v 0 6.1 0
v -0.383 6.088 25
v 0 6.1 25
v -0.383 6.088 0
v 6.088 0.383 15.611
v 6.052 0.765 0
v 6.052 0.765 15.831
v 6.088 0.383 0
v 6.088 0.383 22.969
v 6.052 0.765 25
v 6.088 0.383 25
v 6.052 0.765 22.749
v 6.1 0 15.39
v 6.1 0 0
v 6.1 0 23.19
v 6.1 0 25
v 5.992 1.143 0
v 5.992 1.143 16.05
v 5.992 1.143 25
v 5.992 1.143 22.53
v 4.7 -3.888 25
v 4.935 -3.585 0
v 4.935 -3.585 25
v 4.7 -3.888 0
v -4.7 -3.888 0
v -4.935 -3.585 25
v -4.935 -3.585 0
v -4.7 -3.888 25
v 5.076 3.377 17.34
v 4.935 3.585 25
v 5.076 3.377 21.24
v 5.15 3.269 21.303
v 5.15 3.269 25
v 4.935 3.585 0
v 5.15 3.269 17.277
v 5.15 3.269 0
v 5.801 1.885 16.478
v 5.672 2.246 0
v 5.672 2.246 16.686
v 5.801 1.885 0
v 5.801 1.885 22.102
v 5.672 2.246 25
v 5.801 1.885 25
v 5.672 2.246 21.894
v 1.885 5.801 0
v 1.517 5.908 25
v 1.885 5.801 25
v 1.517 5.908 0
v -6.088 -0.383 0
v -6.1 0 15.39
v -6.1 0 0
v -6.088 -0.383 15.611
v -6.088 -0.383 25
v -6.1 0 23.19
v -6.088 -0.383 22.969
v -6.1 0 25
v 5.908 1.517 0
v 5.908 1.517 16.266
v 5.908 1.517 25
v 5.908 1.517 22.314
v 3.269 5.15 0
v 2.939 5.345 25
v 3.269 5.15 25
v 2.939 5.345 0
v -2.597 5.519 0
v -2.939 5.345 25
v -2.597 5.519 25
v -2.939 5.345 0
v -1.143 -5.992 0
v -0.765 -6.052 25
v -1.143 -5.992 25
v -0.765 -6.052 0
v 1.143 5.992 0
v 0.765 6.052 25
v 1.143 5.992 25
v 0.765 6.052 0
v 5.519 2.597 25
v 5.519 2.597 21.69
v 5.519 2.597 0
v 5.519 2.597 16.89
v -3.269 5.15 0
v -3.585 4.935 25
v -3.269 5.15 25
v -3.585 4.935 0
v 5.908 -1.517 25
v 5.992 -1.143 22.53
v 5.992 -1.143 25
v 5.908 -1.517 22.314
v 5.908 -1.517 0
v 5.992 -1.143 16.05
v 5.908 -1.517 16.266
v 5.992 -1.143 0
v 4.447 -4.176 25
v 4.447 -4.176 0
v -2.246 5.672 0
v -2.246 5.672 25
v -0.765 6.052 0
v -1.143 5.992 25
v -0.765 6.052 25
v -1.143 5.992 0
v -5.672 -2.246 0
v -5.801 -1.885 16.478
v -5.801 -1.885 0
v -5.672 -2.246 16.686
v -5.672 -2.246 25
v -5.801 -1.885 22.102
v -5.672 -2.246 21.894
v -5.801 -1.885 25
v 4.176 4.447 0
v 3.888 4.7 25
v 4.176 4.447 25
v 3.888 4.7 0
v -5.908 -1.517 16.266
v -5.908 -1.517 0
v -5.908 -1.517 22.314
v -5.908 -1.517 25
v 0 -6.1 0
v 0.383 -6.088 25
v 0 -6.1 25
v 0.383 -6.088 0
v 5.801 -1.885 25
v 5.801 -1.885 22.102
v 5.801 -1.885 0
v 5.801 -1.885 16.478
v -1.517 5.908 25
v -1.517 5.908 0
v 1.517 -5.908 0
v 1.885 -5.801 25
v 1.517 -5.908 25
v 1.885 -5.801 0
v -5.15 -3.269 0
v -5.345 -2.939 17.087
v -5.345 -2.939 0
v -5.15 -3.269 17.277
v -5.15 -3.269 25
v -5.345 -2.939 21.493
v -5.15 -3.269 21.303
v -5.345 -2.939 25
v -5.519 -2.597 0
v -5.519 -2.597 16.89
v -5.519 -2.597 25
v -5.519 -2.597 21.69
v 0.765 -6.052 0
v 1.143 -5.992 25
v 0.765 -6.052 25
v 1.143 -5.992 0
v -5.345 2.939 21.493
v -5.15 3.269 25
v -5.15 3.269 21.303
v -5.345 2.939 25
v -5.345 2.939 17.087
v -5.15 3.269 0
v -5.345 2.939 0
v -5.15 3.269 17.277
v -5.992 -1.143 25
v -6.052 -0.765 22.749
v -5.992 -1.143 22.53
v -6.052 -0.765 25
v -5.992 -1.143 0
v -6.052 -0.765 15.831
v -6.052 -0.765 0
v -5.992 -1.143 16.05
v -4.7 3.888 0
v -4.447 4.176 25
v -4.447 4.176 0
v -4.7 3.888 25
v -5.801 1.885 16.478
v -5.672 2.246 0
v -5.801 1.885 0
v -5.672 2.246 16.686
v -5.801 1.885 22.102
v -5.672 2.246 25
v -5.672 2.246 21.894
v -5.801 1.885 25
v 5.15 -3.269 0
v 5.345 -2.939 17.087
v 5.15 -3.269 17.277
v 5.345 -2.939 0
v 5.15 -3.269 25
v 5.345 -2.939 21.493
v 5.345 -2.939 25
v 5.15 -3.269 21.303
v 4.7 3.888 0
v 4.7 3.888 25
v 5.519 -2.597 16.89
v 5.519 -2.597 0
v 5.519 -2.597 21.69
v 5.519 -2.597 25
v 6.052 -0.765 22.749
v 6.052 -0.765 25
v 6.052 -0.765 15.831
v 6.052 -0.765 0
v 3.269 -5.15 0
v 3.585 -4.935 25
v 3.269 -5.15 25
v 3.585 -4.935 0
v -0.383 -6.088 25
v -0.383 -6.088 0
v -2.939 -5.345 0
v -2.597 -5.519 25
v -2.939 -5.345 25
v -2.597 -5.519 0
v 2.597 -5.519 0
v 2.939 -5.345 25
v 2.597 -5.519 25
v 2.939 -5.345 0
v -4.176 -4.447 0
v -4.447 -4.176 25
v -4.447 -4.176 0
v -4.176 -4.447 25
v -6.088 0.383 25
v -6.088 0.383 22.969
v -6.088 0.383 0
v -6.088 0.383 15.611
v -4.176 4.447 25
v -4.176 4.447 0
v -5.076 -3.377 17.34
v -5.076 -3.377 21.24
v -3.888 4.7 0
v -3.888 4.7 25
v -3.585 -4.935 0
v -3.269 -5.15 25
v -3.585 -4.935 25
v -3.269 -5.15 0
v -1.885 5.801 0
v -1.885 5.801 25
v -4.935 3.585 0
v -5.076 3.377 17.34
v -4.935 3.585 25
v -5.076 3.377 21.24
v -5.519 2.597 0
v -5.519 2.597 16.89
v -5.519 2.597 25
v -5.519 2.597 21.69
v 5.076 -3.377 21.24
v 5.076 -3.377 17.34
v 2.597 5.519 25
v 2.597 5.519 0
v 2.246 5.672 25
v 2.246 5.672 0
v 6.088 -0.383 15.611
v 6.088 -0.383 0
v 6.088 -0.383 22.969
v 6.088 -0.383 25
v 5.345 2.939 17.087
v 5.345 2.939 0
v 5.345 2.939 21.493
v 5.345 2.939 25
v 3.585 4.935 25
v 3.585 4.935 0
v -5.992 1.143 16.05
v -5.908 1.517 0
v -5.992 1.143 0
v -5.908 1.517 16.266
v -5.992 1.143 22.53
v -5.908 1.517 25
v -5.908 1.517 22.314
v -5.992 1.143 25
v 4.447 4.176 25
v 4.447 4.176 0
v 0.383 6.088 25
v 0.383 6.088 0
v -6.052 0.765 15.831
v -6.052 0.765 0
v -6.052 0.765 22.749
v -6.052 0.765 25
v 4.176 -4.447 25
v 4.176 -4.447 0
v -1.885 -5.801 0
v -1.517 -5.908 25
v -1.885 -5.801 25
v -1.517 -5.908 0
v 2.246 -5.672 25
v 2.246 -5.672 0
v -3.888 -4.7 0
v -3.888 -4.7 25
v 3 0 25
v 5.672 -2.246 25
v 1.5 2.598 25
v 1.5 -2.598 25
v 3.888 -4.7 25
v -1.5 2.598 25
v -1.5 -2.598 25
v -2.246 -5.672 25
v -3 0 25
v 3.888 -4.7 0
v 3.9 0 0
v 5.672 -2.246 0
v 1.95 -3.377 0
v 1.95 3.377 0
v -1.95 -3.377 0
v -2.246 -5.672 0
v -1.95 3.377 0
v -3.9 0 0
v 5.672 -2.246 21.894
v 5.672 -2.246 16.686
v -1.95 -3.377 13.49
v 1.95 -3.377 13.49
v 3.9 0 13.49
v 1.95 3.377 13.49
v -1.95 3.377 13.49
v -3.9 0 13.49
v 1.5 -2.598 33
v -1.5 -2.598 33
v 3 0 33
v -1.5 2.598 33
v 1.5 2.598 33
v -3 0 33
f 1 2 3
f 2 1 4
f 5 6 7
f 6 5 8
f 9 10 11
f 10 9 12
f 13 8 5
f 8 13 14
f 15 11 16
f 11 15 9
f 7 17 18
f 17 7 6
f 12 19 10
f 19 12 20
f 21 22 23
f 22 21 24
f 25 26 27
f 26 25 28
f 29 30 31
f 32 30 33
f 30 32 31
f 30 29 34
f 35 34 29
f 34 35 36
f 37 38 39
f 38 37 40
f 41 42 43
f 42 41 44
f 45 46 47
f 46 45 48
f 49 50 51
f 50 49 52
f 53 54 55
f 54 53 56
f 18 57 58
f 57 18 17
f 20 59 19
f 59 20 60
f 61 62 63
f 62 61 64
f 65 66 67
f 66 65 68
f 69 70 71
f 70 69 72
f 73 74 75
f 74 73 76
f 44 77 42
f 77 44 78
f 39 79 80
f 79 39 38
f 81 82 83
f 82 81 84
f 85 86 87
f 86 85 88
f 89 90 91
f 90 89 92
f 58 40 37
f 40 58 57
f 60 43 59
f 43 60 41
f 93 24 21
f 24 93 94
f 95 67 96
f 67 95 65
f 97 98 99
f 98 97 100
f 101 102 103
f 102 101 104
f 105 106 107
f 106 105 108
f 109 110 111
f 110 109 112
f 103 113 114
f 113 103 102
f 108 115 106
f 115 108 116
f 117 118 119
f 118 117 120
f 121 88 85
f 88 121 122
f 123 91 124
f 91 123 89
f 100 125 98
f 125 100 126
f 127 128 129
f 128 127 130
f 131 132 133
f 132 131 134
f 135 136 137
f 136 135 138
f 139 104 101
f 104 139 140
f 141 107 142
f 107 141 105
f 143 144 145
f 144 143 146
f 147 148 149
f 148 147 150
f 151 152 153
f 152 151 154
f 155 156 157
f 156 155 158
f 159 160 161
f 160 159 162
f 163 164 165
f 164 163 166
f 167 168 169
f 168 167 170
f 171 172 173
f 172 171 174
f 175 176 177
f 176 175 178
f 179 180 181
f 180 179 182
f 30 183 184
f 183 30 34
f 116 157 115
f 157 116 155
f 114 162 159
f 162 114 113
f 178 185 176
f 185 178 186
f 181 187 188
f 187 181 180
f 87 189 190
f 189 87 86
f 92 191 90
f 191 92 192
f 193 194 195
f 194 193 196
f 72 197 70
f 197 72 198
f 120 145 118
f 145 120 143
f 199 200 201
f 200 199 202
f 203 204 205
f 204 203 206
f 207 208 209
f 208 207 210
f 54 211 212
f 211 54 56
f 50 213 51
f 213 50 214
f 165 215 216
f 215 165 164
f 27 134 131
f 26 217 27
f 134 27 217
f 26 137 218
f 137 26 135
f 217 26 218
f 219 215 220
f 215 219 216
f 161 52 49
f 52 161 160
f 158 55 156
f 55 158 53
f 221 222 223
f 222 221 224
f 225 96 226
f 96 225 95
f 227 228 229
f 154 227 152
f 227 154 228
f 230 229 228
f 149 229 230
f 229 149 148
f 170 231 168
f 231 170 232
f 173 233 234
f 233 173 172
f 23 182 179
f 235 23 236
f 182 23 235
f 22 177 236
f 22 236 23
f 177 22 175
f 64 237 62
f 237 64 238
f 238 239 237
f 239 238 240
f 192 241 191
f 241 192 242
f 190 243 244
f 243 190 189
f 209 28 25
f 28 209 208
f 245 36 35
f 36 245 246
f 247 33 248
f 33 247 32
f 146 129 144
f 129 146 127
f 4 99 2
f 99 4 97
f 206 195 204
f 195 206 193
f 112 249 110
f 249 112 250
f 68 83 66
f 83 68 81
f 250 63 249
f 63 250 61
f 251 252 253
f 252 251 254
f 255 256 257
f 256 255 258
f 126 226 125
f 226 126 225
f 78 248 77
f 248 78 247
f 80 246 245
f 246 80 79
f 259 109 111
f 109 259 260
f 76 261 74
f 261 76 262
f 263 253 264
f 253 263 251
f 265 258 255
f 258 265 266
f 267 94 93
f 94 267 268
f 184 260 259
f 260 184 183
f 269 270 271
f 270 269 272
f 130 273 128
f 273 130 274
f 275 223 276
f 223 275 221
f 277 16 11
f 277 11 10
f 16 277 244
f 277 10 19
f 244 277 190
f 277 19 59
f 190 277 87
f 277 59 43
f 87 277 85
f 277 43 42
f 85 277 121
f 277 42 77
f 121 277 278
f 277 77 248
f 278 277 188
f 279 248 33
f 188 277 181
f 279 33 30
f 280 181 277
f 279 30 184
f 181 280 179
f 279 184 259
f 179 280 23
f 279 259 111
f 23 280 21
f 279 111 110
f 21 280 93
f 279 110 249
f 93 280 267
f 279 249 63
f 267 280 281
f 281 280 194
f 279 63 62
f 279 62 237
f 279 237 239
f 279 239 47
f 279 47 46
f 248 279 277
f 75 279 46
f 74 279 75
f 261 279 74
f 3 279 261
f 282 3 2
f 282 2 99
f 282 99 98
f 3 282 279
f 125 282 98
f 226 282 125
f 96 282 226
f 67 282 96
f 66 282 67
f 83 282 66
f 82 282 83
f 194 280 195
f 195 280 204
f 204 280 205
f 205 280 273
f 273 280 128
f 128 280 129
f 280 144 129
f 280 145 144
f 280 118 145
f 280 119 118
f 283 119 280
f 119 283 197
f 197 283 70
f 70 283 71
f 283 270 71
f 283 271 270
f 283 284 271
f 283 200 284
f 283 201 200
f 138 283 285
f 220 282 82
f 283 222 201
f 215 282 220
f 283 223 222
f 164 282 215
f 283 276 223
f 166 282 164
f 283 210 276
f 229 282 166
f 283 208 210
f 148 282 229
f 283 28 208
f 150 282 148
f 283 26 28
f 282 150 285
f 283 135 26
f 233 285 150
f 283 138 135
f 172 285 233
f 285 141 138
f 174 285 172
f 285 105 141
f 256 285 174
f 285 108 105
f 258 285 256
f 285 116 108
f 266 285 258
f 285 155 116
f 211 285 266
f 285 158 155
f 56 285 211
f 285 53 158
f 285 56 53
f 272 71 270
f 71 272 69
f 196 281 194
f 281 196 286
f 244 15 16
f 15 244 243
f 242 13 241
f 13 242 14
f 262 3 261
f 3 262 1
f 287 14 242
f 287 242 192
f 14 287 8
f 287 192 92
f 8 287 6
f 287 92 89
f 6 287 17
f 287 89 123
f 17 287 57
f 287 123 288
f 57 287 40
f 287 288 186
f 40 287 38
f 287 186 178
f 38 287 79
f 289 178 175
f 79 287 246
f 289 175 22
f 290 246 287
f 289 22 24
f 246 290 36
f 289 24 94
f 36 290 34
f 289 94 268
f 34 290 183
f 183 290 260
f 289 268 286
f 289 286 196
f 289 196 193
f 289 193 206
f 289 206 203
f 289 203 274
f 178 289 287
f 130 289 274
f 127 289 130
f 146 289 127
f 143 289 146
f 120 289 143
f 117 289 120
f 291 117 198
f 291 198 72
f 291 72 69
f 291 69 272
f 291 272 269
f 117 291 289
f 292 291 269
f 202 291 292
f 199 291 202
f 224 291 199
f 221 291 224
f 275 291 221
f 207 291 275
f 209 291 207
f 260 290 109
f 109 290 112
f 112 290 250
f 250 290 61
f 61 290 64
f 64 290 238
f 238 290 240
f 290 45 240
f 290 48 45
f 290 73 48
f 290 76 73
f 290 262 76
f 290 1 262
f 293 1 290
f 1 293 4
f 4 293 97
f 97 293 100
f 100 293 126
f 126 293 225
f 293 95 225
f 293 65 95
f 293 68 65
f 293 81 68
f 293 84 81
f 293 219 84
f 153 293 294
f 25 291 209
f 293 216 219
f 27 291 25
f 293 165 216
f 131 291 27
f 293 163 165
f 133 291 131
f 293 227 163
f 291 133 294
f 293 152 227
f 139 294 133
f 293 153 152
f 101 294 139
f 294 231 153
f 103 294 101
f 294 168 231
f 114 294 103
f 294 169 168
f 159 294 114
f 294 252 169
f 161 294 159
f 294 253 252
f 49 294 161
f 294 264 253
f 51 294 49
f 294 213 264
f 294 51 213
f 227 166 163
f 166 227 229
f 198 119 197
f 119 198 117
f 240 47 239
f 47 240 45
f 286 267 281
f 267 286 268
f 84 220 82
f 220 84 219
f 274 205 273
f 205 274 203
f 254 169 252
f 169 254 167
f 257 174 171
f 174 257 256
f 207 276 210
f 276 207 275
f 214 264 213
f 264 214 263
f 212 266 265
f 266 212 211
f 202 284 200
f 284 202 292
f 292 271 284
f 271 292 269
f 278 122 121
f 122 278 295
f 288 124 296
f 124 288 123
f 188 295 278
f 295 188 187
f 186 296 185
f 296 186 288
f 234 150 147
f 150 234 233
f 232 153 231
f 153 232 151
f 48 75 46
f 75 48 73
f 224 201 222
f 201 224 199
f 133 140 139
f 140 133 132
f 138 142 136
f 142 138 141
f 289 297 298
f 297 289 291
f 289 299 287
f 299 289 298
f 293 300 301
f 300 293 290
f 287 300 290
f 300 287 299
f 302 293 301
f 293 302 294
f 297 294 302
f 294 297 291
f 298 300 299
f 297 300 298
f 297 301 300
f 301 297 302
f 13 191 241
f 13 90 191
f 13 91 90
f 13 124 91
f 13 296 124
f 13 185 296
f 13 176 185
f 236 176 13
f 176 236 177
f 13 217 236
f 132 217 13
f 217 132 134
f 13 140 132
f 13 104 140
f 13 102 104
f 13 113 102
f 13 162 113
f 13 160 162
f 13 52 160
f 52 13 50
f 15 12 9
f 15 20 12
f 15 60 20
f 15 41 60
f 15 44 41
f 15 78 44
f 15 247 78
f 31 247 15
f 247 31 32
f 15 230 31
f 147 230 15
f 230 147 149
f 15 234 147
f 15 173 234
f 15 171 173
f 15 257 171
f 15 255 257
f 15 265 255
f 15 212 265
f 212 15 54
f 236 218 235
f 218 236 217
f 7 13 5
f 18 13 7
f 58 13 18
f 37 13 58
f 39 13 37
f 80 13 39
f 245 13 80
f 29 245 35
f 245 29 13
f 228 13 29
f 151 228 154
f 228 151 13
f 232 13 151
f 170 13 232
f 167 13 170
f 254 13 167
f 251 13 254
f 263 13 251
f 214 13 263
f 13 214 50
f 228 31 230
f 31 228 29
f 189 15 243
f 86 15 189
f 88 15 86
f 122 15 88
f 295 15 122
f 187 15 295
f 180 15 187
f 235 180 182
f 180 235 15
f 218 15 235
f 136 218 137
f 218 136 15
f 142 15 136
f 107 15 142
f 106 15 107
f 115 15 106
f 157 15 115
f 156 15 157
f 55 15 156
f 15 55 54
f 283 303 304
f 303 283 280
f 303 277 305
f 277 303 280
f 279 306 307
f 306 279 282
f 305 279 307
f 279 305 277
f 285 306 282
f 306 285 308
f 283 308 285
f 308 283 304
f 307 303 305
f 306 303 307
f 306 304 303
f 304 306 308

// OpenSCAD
$fn=100; 
hex_radius = 3.9;
body_height = 25;
body_radius = 6.1;


difference()
{
    difference(){
        cylinder(body_height,body_radius,body_radius);
        translate([0,0,-0.01]){
            cylinder(r=hex_radius, h=13.5, $fn=6);
        }
    }


    translate([0,0, 15 + hex_radius * 1.1]){
        rotate([0,90,0]){
           cylinder(r=hex_radius, h=33.5, center=true, $fn=6);
        }
    }
}

translate([0,0, body_height]){
cylinder(8,3,3, $fn=6);
}
